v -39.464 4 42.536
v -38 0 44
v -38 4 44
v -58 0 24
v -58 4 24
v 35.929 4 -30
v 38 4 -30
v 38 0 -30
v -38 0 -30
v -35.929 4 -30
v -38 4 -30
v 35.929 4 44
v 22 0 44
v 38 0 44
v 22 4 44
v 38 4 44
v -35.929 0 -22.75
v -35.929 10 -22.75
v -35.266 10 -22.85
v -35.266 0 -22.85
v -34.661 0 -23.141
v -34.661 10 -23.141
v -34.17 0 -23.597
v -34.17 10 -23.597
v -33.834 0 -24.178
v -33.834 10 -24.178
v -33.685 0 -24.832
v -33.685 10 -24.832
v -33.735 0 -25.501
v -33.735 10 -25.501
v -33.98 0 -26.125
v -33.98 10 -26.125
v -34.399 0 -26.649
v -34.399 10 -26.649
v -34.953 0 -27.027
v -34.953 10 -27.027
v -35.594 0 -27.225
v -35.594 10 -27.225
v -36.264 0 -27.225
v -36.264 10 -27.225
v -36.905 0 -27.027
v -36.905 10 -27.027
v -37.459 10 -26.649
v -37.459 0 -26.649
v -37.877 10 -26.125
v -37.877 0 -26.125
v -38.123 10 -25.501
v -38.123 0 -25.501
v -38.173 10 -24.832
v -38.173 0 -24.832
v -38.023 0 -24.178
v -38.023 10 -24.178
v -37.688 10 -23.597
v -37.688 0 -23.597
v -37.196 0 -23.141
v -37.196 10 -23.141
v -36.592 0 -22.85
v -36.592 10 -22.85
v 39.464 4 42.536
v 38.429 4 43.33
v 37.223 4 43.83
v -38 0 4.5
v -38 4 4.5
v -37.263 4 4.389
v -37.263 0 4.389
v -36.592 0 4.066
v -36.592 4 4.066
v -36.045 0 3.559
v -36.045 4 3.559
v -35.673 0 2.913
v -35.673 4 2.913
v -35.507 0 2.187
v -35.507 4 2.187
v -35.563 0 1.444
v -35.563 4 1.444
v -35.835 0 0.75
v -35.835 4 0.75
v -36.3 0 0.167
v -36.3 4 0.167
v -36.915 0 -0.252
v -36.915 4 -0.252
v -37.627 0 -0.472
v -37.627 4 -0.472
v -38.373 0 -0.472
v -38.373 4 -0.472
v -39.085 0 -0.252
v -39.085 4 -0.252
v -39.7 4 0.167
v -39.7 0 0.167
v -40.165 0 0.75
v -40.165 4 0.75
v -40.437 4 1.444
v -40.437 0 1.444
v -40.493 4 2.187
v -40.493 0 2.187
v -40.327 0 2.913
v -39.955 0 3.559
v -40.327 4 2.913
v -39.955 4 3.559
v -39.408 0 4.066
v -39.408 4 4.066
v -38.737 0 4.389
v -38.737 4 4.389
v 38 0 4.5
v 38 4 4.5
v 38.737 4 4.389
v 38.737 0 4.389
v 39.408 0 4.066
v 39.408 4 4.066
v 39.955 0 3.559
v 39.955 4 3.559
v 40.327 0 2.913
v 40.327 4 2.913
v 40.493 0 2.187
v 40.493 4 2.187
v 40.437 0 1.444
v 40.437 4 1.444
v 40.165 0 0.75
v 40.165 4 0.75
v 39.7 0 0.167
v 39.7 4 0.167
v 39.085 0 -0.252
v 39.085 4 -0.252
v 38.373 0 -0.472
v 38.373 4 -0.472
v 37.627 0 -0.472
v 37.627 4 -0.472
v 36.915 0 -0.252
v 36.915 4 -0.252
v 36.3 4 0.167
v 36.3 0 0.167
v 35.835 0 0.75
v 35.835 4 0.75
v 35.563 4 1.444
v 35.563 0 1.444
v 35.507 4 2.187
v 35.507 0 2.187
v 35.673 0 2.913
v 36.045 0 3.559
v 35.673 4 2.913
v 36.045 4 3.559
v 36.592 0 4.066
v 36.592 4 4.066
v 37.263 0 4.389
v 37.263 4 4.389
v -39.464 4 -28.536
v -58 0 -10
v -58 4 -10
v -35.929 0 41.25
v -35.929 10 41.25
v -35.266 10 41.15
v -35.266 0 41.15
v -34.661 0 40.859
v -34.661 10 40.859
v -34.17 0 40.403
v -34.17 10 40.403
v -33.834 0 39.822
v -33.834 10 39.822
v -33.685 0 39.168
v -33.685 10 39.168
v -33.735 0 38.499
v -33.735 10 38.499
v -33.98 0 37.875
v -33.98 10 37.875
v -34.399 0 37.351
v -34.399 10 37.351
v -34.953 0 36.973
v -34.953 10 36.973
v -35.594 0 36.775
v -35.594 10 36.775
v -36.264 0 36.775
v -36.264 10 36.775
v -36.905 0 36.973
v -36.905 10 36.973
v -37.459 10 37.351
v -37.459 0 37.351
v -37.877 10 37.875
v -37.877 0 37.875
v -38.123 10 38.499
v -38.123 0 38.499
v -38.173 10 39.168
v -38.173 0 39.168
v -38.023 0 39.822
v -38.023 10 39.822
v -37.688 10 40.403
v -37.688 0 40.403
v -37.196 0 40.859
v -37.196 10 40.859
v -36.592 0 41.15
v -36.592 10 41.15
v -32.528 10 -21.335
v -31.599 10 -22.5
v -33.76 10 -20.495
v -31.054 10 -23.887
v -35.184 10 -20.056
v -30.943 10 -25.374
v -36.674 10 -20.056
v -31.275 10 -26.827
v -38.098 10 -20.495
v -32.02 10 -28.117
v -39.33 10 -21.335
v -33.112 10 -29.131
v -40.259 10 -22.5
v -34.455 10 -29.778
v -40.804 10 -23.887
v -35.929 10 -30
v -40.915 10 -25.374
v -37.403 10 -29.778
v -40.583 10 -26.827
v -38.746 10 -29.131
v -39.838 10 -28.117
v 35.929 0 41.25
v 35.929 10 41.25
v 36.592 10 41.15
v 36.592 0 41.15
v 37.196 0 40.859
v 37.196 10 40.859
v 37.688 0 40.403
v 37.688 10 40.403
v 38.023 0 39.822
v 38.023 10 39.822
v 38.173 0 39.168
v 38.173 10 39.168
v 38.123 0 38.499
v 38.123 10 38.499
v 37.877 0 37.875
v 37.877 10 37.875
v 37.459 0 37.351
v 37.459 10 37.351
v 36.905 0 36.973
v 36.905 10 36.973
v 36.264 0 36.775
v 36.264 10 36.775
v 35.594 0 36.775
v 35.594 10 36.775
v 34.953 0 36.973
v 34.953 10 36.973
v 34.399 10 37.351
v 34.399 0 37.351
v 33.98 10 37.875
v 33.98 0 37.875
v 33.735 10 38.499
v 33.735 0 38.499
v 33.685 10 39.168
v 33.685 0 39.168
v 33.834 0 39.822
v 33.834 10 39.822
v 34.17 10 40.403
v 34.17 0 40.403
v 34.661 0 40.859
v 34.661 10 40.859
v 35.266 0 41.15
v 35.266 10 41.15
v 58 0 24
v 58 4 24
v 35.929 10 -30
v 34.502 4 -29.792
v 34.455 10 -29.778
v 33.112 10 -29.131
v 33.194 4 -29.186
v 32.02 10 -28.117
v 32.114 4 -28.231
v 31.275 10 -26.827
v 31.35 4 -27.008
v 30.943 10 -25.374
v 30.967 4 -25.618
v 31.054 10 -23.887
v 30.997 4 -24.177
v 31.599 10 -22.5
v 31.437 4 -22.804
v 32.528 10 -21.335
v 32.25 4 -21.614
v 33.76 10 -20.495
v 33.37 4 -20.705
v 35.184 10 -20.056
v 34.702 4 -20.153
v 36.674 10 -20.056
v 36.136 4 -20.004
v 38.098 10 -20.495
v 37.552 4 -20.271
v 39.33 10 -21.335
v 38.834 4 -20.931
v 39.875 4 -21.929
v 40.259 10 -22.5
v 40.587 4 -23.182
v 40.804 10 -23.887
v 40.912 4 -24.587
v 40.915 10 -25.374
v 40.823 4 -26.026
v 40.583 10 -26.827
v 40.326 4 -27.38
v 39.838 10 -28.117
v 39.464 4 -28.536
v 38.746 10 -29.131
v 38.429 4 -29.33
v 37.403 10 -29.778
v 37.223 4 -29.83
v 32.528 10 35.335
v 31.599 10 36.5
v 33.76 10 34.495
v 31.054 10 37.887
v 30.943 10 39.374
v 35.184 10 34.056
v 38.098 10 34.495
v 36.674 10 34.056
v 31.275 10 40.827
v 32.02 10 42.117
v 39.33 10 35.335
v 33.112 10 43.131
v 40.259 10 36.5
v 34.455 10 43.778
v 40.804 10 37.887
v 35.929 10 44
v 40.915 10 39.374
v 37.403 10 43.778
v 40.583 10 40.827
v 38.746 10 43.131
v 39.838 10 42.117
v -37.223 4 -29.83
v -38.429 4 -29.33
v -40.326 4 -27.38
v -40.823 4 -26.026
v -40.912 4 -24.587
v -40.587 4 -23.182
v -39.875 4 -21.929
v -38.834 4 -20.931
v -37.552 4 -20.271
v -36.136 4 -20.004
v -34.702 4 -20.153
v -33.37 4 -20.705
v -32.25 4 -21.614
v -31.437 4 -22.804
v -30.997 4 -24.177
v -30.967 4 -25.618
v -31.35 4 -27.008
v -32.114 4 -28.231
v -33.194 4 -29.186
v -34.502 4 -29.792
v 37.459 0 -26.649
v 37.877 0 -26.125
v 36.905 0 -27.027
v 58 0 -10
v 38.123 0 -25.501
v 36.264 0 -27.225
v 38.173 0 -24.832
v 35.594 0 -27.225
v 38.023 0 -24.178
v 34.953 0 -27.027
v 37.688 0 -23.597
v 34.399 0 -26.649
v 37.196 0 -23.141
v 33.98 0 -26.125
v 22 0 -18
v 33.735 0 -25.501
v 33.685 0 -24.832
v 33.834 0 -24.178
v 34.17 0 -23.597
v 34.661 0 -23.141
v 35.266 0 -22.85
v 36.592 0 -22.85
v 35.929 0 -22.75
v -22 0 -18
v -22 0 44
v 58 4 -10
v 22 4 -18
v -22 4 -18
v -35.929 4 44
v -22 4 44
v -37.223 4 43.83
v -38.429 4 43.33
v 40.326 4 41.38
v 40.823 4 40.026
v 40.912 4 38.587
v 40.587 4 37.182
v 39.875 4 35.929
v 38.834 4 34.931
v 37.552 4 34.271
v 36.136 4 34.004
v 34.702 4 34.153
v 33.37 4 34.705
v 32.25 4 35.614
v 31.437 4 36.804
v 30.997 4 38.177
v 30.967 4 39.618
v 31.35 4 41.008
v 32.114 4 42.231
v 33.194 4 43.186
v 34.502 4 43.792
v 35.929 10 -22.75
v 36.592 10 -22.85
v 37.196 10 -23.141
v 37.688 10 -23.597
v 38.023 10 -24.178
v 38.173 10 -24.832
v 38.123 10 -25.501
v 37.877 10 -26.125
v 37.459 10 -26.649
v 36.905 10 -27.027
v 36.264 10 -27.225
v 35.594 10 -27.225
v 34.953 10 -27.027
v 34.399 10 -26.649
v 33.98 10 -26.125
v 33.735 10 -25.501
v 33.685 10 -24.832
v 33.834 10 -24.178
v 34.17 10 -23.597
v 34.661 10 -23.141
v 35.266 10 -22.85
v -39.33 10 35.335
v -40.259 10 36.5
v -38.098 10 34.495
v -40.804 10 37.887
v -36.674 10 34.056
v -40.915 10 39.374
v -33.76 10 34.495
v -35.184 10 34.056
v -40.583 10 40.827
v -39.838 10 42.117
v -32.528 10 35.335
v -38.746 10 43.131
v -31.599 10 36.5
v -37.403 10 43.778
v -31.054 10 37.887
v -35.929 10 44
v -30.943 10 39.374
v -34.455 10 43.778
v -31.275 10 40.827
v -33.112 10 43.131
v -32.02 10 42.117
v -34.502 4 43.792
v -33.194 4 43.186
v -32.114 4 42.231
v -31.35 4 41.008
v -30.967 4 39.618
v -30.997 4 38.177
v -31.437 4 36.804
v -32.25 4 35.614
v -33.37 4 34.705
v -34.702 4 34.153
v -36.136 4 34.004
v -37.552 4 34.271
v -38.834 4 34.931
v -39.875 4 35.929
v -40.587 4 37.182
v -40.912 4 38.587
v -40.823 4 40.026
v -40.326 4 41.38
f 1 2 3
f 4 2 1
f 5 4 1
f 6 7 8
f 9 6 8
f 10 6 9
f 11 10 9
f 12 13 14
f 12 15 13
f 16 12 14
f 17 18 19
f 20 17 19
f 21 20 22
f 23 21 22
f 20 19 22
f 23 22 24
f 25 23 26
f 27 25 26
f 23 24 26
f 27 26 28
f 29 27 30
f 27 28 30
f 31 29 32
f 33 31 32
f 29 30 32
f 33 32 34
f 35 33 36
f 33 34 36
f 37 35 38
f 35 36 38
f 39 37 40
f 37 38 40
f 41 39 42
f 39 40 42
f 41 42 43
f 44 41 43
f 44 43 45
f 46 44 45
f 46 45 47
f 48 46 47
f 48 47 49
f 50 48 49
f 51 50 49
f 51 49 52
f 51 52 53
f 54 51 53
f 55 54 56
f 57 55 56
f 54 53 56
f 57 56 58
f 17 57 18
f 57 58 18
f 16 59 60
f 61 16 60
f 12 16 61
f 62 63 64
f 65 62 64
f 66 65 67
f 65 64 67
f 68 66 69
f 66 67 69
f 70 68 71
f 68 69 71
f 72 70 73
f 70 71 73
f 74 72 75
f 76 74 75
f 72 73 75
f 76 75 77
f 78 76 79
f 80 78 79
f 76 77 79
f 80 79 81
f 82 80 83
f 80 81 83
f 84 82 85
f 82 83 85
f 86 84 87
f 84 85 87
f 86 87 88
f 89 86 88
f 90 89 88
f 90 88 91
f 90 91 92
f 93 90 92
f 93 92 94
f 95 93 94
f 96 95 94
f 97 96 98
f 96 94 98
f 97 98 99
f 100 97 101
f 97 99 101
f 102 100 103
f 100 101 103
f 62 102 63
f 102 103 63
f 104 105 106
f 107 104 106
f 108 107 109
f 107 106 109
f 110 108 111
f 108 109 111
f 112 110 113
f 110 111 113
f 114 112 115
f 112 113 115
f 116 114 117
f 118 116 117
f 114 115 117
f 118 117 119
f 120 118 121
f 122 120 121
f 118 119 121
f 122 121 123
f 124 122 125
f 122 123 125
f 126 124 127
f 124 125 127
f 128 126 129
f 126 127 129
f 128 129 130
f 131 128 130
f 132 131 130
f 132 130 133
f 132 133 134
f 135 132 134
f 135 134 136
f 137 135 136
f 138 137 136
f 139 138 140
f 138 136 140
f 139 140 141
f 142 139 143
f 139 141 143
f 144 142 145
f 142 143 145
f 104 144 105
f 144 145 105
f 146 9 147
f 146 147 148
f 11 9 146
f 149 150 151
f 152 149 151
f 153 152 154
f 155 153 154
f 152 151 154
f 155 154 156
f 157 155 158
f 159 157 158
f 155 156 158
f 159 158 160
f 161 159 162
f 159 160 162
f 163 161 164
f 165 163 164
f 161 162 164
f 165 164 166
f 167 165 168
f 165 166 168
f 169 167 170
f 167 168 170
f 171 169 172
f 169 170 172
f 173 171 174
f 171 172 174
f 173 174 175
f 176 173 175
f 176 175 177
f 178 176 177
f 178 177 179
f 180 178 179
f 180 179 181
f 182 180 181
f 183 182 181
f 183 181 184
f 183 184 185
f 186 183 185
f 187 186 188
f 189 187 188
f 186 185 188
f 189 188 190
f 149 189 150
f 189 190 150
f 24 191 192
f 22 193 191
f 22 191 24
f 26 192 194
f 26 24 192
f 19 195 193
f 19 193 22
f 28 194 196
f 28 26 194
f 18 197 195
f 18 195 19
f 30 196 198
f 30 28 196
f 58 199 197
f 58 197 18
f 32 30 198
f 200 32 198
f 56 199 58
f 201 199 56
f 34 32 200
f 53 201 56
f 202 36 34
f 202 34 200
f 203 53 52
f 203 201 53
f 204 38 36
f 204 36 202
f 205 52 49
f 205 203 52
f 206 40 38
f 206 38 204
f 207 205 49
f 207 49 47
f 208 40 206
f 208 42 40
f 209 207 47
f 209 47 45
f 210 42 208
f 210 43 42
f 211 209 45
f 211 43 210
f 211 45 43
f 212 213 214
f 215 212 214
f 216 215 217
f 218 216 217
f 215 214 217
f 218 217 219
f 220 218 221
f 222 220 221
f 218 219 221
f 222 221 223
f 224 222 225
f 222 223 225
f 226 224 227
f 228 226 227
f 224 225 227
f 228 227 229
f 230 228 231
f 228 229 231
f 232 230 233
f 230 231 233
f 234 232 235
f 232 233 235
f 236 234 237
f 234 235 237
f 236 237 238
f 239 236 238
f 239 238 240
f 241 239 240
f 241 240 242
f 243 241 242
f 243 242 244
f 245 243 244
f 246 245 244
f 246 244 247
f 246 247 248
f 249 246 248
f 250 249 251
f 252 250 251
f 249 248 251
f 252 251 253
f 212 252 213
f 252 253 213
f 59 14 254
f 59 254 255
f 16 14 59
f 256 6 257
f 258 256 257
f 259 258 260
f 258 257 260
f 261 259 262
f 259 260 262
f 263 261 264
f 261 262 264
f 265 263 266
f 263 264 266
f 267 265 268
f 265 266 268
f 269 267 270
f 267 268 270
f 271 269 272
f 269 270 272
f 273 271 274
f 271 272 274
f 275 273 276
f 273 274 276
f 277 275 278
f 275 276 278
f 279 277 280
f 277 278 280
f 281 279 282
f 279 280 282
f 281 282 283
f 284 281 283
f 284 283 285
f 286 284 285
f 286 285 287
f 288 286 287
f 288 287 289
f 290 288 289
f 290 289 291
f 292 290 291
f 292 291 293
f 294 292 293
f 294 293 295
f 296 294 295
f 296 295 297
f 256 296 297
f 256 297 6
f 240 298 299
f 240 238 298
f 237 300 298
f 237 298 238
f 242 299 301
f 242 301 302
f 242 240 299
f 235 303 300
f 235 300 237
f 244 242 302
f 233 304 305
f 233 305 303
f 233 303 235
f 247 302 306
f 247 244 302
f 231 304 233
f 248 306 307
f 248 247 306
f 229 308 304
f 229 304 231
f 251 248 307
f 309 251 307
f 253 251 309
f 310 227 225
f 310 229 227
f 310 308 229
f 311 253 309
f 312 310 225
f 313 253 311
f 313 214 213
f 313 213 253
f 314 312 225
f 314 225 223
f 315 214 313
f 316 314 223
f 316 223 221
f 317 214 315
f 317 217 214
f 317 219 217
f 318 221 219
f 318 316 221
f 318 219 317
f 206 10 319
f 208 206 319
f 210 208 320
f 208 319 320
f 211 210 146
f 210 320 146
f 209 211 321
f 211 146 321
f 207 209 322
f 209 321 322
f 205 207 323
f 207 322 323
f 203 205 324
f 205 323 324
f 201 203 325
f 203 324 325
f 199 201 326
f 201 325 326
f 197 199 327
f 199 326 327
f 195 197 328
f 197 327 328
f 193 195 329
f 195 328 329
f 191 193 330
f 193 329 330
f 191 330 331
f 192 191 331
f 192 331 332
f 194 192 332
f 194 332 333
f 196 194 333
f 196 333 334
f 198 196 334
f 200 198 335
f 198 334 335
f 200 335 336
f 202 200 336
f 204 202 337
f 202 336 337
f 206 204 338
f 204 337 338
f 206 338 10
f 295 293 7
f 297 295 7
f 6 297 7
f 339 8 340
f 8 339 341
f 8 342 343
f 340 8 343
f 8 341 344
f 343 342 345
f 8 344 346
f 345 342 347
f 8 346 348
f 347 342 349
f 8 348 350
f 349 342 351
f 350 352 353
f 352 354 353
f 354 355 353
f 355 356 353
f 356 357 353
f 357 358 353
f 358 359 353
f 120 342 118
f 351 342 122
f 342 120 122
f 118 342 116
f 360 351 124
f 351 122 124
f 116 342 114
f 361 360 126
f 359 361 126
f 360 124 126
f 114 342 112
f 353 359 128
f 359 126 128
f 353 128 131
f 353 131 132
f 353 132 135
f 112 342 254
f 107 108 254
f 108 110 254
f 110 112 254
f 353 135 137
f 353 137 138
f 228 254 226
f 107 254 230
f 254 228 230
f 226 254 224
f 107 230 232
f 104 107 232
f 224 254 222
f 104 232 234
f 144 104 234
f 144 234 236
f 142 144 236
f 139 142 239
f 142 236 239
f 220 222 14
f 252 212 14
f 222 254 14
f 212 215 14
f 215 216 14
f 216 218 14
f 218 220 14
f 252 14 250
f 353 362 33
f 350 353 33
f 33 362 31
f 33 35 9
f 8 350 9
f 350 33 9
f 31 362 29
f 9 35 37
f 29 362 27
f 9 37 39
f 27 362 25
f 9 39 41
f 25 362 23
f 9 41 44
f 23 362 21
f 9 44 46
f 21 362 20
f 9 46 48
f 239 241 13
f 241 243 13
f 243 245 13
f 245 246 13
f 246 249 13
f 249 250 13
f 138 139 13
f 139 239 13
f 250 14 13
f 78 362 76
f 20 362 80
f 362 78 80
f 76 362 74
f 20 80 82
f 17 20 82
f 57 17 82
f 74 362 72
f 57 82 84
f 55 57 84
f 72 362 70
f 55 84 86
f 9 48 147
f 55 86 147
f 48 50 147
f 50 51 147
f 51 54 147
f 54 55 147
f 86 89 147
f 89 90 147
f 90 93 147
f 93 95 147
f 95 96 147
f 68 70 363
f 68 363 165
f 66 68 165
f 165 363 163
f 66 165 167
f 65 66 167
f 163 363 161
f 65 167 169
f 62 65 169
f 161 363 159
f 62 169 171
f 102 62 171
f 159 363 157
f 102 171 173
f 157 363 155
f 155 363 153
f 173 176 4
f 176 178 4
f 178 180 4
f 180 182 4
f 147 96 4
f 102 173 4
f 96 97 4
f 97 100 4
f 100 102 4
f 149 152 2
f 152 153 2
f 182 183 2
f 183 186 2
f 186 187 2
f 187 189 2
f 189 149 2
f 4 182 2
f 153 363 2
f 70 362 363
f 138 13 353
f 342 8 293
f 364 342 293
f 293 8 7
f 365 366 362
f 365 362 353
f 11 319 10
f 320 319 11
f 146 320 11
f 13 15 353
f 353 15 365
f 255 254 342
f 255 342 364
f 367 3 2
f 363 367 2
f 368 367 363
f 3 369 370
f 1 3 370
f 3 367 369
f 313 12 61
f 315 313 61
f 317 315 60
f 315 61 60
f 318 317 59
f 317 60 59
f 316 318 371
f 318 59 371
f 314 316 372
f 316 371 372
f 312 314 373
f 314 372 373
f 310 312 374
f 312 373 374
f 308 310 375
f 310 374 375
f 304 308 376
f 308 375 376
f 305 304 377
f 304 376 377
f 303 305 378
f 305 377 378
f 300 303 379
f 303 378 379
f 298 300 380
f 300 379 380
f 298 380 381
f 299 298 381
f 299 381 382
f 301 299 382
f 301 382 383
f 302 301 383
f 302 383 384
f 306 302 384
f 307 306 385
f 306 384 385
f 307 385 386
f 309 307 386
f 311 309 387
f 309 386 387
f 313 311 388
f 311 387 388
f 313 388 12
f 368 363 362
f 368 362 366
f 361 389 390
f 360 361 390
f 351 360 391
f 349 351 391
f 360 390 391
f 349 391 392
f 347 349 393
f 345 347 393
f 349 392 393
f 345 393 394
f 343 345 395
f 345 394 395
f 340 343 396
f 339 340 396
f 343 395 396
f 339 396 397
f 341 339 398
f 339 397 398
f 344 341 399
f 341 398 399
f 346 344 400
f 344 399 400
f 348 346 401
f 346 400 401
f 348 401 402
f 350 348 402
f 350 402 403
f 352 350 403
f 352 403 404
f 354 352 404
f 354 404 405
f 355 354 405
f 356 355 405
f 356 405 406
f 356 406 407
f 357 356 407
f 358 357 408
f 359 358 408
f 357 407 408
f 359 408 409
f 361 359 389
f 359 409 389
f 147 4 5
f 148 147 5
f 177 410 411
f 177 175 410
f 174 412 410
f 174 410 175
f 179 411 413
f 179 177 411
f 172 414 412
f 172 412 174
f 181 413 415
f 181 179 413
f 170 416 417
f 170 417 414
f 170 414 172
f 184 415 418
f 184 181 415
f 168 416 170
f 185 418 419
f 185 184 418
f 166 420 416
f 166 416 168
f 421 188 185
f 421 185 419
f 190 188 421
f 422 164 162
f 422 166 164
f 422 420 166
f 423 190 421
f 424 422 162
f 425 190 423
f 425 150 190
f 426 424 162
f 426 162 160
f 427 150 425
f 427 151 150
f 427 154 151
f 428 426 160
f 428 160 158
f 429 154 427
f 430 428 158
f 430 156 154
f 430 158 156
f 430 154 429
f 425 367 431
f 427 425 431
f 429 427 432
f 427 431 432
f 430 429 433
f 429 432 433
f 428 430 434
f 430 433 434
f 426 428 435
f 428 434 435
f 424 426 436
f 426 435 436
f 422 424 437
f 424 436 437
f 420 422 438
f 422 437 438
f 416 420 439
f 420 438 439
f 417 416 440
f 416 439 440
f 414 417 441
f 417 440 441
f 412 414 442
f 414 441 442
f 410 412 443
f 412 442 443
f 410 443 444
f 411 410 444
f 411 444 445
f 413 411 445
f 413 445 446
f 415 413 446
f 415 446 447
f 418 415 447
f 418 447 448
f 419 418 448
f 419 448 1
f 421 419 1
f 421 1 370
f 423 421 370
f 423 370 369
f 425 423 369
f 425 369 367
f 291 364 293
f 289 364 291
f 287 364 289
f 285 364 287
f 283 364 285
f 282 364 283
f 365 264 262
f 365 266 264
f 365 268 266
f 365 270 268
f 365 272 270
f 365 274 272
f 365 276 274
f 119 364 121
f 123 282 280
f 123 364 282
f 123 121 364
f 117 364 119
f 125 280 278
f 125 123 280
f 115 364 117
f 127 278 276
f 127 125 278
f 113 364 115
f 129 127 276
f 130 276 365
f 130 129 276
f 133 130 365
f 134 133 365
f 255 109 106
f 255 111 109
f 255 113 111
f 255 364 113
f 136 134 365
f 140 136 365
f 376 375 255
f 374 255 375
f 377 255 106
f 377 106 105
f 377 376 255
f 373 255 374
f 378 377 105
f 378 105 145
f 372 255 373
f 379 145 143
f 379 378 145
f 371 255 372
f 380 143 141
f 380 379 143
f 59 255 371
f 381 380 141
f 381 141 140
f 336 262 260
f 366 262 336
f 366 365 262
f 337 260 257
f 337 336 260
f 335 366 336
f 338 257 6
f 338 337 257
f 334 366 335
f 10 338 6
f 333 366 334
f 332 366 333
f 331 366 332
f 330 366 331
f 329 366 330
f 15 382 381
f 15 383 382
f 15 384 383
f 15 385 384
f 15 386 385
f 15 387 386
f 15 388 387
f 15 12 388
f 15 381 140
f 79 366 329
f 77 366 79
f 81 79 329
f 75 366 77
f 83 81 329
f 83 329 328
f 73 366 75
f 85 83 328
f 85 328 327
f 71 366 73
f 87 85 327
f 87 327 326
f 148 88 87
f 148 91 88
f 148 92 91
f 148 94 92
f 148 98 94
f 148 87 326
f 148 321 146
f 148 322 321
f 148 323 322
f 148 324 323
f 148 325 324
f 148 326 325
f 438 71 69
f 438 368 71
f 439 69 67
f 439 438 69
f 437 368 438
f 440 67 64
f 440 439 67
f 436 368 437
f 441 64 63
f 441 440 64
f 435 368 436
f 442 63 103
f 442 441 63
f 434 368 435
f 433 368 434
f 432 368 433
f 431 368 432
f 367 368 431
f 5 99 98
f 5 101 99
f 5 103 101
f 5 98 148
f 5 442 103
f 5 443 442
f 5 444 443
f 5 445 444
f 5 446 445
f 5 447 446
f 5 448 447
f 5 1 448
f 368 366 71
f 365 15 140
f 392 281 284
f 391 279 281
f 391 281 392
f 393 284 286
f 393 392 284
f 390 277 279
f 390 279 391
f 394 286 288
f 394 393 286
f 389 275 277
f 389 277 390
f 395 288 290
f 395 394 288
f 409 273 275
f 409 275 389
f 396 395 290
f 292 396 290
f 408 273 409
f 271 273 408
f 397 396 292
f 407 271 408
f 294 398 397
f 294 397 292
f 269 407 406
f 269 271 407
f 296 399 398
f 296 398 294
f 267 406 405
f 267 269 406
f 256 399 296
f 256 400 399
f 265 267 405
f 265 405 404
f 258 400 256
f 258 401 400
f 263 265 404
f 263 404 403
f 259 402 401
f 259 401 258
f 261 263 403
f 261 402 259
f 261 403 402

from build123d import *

# Parameters (mm, degrees)
SKETCH1_W           = 116
SKETCH1_H           = 48
BOSS_EXTRUDE1_DEPTH = 4
SKETCH2_R           = 2.5
CUT_EXTRUDE1_DEPTH  = 4
SKETCH3_W           = 44
SKETCH3_H           = 42
CUT_EXTRUDE2_DEPTH  = 4
SKETCH4_W           = 36
SKETCH4_H           = 4
BOSS_EXTRUDE2_DEPTH = 20
SKETCH5_W           = 116
SKETCH5_H           = 4
BOSS_EXTRUDE3_DEPTH = 6
CHAMFER1_SIZE       = 20
SKETCH6_R           = 5
BOSS_EXTRUDE4_DEPTH = 6
SKETCH7_R           = 2.25
CUT_EXTRUDE3_DEPTH  = 10


with BuildPart() as part:
    # Sketch1 → Boss-Extrude1 (new body)
    with BuildSketch(Plane(origin=(0, 0, 0), x_dir=(1, 0, 0), z_dir=(0, 1, 0))):
        Rectangle(SKETCH1_W, SKETCH1_H)
    extrude(amount=BOSS_EXTRUDE1_DEPTH)

    # Sketch2 → Cut-Extrude1 (cut)
    with BuildSketch(Plane(origin=(0, 4, 0), x_dir=(1, 0, 0), z_dir=(0, 1, 0))):
        with Locations(Location((-38, -2, 0), (0, 0, 270))):
            Circle(SKETCH2_R)
        with Locations(Location((38, -2, 0), (0, 0, 270))):
            Circle(SKETCH2_R)
    extrude(amount=-CUT_EXTRUDE1_DEPTH, mode=Mode.SUBTRACT)

    # Sketch3 → Cut-Extrude2 (cut)
    with BuildSketch(Plane(origin=(0, 4, 0), x_dir=(1, 0, 0), z_dir=(0, 1, 0))):
        with Locations((0, -3)):
            Rectangle(SKETCH3_W, SKETCH3_H)
    extrude(amount=-CUT_EXTRUDE2_DEPTH, mode=Mode.SUBTRACT)

    # Sketch4 → Boss-Extrude2 (add)
    with BuildSketch(Plane.XY.offset(24)):
        with Locations((-40, 2)):
            Rectangle(SKETCH4_W, SKETCH4_H)
        with Locations((40, 2)):
            Rectangle(SKETCH4_W, SKETCH4_H)
    extrude(amount=BOSS_EXTRUDE2_DEPTH)

    # Sketch5 → Boss-Extrude3 (add)
    with BuildSketch(Plane(origin=(0, 0, -24), x_dir=(-1, 0, 0), z_dir=(0, 0, -1))):
        with Locations((0, 2)):
            Rectangle(SKETCH5_W, SKETCH5_H)
    extrude(amount=BOSS_EXTRUDE3_DEPTH)

    # Chamfer1
    chamfer1_edges = [part.edges().sort_by_distance(p)[0] for p in [
        (-58, 2, 44),
        (58, 2, 44),
        (58, 2, -30),
        (-58, 2, -30),
    ]]
    chamfer(chamfer1_edges, length=CHAMFER1_SIZE)

    # Sketch6 → Boss-Extrude4 (add)
    with BuildSketch(Plane(origin=(0, 4, 0), x_dir=(1, 0, 0), z_dir=(0, 1, 0))):
        with Locations(Location((-35.928932188, 25, 0), (0, 0, 90))):
            Circle(SKETCH6_R)
        with Locations(Location((35.928932188, 25, 0), (0, 0, 90))):
            Circle(SKETCH6_R)
        with Locations(Location((35.928932188, -39, 0), (0, 0, 270))):
            Circle(SKETCH6_R)
        with Locations(Location((-35.928932188, -39, 0), (0, 0, 270))):
            Circle(SKETCH6_R)
    extrude(amount=BOSS_EXTRUDE4_DEPTH)

    # Sketch7 → Cut-Extrude3 (cut)
    with BuildSketch(Plane(origin=(0, 10, 0), x_dir=(1, 0, 0), z_dir=(0, 1, 0))):
        with Locations(Location((-35.928932188, 25, 0), (0, 0, 270))):
            Circle(SKETCH7_R)
        with Locations(Location((35.928932188, 25, 0), (0, 0, 270))):
            Circle(SKETCH7_R)
        with Locations(Location((35.928932188, -39, 0), (0, 0, 270))):
            Circle(SKETCH7_R)
        with Locations(Location((-35.928932188, -39, 0), (0, 0, 270))):
            Circle(SKETCH7_R)
    extrude(amount=-CUT_EXTRUDE3_DEPTH, mode=Mode.SUBTRACT)


solid = part.part
